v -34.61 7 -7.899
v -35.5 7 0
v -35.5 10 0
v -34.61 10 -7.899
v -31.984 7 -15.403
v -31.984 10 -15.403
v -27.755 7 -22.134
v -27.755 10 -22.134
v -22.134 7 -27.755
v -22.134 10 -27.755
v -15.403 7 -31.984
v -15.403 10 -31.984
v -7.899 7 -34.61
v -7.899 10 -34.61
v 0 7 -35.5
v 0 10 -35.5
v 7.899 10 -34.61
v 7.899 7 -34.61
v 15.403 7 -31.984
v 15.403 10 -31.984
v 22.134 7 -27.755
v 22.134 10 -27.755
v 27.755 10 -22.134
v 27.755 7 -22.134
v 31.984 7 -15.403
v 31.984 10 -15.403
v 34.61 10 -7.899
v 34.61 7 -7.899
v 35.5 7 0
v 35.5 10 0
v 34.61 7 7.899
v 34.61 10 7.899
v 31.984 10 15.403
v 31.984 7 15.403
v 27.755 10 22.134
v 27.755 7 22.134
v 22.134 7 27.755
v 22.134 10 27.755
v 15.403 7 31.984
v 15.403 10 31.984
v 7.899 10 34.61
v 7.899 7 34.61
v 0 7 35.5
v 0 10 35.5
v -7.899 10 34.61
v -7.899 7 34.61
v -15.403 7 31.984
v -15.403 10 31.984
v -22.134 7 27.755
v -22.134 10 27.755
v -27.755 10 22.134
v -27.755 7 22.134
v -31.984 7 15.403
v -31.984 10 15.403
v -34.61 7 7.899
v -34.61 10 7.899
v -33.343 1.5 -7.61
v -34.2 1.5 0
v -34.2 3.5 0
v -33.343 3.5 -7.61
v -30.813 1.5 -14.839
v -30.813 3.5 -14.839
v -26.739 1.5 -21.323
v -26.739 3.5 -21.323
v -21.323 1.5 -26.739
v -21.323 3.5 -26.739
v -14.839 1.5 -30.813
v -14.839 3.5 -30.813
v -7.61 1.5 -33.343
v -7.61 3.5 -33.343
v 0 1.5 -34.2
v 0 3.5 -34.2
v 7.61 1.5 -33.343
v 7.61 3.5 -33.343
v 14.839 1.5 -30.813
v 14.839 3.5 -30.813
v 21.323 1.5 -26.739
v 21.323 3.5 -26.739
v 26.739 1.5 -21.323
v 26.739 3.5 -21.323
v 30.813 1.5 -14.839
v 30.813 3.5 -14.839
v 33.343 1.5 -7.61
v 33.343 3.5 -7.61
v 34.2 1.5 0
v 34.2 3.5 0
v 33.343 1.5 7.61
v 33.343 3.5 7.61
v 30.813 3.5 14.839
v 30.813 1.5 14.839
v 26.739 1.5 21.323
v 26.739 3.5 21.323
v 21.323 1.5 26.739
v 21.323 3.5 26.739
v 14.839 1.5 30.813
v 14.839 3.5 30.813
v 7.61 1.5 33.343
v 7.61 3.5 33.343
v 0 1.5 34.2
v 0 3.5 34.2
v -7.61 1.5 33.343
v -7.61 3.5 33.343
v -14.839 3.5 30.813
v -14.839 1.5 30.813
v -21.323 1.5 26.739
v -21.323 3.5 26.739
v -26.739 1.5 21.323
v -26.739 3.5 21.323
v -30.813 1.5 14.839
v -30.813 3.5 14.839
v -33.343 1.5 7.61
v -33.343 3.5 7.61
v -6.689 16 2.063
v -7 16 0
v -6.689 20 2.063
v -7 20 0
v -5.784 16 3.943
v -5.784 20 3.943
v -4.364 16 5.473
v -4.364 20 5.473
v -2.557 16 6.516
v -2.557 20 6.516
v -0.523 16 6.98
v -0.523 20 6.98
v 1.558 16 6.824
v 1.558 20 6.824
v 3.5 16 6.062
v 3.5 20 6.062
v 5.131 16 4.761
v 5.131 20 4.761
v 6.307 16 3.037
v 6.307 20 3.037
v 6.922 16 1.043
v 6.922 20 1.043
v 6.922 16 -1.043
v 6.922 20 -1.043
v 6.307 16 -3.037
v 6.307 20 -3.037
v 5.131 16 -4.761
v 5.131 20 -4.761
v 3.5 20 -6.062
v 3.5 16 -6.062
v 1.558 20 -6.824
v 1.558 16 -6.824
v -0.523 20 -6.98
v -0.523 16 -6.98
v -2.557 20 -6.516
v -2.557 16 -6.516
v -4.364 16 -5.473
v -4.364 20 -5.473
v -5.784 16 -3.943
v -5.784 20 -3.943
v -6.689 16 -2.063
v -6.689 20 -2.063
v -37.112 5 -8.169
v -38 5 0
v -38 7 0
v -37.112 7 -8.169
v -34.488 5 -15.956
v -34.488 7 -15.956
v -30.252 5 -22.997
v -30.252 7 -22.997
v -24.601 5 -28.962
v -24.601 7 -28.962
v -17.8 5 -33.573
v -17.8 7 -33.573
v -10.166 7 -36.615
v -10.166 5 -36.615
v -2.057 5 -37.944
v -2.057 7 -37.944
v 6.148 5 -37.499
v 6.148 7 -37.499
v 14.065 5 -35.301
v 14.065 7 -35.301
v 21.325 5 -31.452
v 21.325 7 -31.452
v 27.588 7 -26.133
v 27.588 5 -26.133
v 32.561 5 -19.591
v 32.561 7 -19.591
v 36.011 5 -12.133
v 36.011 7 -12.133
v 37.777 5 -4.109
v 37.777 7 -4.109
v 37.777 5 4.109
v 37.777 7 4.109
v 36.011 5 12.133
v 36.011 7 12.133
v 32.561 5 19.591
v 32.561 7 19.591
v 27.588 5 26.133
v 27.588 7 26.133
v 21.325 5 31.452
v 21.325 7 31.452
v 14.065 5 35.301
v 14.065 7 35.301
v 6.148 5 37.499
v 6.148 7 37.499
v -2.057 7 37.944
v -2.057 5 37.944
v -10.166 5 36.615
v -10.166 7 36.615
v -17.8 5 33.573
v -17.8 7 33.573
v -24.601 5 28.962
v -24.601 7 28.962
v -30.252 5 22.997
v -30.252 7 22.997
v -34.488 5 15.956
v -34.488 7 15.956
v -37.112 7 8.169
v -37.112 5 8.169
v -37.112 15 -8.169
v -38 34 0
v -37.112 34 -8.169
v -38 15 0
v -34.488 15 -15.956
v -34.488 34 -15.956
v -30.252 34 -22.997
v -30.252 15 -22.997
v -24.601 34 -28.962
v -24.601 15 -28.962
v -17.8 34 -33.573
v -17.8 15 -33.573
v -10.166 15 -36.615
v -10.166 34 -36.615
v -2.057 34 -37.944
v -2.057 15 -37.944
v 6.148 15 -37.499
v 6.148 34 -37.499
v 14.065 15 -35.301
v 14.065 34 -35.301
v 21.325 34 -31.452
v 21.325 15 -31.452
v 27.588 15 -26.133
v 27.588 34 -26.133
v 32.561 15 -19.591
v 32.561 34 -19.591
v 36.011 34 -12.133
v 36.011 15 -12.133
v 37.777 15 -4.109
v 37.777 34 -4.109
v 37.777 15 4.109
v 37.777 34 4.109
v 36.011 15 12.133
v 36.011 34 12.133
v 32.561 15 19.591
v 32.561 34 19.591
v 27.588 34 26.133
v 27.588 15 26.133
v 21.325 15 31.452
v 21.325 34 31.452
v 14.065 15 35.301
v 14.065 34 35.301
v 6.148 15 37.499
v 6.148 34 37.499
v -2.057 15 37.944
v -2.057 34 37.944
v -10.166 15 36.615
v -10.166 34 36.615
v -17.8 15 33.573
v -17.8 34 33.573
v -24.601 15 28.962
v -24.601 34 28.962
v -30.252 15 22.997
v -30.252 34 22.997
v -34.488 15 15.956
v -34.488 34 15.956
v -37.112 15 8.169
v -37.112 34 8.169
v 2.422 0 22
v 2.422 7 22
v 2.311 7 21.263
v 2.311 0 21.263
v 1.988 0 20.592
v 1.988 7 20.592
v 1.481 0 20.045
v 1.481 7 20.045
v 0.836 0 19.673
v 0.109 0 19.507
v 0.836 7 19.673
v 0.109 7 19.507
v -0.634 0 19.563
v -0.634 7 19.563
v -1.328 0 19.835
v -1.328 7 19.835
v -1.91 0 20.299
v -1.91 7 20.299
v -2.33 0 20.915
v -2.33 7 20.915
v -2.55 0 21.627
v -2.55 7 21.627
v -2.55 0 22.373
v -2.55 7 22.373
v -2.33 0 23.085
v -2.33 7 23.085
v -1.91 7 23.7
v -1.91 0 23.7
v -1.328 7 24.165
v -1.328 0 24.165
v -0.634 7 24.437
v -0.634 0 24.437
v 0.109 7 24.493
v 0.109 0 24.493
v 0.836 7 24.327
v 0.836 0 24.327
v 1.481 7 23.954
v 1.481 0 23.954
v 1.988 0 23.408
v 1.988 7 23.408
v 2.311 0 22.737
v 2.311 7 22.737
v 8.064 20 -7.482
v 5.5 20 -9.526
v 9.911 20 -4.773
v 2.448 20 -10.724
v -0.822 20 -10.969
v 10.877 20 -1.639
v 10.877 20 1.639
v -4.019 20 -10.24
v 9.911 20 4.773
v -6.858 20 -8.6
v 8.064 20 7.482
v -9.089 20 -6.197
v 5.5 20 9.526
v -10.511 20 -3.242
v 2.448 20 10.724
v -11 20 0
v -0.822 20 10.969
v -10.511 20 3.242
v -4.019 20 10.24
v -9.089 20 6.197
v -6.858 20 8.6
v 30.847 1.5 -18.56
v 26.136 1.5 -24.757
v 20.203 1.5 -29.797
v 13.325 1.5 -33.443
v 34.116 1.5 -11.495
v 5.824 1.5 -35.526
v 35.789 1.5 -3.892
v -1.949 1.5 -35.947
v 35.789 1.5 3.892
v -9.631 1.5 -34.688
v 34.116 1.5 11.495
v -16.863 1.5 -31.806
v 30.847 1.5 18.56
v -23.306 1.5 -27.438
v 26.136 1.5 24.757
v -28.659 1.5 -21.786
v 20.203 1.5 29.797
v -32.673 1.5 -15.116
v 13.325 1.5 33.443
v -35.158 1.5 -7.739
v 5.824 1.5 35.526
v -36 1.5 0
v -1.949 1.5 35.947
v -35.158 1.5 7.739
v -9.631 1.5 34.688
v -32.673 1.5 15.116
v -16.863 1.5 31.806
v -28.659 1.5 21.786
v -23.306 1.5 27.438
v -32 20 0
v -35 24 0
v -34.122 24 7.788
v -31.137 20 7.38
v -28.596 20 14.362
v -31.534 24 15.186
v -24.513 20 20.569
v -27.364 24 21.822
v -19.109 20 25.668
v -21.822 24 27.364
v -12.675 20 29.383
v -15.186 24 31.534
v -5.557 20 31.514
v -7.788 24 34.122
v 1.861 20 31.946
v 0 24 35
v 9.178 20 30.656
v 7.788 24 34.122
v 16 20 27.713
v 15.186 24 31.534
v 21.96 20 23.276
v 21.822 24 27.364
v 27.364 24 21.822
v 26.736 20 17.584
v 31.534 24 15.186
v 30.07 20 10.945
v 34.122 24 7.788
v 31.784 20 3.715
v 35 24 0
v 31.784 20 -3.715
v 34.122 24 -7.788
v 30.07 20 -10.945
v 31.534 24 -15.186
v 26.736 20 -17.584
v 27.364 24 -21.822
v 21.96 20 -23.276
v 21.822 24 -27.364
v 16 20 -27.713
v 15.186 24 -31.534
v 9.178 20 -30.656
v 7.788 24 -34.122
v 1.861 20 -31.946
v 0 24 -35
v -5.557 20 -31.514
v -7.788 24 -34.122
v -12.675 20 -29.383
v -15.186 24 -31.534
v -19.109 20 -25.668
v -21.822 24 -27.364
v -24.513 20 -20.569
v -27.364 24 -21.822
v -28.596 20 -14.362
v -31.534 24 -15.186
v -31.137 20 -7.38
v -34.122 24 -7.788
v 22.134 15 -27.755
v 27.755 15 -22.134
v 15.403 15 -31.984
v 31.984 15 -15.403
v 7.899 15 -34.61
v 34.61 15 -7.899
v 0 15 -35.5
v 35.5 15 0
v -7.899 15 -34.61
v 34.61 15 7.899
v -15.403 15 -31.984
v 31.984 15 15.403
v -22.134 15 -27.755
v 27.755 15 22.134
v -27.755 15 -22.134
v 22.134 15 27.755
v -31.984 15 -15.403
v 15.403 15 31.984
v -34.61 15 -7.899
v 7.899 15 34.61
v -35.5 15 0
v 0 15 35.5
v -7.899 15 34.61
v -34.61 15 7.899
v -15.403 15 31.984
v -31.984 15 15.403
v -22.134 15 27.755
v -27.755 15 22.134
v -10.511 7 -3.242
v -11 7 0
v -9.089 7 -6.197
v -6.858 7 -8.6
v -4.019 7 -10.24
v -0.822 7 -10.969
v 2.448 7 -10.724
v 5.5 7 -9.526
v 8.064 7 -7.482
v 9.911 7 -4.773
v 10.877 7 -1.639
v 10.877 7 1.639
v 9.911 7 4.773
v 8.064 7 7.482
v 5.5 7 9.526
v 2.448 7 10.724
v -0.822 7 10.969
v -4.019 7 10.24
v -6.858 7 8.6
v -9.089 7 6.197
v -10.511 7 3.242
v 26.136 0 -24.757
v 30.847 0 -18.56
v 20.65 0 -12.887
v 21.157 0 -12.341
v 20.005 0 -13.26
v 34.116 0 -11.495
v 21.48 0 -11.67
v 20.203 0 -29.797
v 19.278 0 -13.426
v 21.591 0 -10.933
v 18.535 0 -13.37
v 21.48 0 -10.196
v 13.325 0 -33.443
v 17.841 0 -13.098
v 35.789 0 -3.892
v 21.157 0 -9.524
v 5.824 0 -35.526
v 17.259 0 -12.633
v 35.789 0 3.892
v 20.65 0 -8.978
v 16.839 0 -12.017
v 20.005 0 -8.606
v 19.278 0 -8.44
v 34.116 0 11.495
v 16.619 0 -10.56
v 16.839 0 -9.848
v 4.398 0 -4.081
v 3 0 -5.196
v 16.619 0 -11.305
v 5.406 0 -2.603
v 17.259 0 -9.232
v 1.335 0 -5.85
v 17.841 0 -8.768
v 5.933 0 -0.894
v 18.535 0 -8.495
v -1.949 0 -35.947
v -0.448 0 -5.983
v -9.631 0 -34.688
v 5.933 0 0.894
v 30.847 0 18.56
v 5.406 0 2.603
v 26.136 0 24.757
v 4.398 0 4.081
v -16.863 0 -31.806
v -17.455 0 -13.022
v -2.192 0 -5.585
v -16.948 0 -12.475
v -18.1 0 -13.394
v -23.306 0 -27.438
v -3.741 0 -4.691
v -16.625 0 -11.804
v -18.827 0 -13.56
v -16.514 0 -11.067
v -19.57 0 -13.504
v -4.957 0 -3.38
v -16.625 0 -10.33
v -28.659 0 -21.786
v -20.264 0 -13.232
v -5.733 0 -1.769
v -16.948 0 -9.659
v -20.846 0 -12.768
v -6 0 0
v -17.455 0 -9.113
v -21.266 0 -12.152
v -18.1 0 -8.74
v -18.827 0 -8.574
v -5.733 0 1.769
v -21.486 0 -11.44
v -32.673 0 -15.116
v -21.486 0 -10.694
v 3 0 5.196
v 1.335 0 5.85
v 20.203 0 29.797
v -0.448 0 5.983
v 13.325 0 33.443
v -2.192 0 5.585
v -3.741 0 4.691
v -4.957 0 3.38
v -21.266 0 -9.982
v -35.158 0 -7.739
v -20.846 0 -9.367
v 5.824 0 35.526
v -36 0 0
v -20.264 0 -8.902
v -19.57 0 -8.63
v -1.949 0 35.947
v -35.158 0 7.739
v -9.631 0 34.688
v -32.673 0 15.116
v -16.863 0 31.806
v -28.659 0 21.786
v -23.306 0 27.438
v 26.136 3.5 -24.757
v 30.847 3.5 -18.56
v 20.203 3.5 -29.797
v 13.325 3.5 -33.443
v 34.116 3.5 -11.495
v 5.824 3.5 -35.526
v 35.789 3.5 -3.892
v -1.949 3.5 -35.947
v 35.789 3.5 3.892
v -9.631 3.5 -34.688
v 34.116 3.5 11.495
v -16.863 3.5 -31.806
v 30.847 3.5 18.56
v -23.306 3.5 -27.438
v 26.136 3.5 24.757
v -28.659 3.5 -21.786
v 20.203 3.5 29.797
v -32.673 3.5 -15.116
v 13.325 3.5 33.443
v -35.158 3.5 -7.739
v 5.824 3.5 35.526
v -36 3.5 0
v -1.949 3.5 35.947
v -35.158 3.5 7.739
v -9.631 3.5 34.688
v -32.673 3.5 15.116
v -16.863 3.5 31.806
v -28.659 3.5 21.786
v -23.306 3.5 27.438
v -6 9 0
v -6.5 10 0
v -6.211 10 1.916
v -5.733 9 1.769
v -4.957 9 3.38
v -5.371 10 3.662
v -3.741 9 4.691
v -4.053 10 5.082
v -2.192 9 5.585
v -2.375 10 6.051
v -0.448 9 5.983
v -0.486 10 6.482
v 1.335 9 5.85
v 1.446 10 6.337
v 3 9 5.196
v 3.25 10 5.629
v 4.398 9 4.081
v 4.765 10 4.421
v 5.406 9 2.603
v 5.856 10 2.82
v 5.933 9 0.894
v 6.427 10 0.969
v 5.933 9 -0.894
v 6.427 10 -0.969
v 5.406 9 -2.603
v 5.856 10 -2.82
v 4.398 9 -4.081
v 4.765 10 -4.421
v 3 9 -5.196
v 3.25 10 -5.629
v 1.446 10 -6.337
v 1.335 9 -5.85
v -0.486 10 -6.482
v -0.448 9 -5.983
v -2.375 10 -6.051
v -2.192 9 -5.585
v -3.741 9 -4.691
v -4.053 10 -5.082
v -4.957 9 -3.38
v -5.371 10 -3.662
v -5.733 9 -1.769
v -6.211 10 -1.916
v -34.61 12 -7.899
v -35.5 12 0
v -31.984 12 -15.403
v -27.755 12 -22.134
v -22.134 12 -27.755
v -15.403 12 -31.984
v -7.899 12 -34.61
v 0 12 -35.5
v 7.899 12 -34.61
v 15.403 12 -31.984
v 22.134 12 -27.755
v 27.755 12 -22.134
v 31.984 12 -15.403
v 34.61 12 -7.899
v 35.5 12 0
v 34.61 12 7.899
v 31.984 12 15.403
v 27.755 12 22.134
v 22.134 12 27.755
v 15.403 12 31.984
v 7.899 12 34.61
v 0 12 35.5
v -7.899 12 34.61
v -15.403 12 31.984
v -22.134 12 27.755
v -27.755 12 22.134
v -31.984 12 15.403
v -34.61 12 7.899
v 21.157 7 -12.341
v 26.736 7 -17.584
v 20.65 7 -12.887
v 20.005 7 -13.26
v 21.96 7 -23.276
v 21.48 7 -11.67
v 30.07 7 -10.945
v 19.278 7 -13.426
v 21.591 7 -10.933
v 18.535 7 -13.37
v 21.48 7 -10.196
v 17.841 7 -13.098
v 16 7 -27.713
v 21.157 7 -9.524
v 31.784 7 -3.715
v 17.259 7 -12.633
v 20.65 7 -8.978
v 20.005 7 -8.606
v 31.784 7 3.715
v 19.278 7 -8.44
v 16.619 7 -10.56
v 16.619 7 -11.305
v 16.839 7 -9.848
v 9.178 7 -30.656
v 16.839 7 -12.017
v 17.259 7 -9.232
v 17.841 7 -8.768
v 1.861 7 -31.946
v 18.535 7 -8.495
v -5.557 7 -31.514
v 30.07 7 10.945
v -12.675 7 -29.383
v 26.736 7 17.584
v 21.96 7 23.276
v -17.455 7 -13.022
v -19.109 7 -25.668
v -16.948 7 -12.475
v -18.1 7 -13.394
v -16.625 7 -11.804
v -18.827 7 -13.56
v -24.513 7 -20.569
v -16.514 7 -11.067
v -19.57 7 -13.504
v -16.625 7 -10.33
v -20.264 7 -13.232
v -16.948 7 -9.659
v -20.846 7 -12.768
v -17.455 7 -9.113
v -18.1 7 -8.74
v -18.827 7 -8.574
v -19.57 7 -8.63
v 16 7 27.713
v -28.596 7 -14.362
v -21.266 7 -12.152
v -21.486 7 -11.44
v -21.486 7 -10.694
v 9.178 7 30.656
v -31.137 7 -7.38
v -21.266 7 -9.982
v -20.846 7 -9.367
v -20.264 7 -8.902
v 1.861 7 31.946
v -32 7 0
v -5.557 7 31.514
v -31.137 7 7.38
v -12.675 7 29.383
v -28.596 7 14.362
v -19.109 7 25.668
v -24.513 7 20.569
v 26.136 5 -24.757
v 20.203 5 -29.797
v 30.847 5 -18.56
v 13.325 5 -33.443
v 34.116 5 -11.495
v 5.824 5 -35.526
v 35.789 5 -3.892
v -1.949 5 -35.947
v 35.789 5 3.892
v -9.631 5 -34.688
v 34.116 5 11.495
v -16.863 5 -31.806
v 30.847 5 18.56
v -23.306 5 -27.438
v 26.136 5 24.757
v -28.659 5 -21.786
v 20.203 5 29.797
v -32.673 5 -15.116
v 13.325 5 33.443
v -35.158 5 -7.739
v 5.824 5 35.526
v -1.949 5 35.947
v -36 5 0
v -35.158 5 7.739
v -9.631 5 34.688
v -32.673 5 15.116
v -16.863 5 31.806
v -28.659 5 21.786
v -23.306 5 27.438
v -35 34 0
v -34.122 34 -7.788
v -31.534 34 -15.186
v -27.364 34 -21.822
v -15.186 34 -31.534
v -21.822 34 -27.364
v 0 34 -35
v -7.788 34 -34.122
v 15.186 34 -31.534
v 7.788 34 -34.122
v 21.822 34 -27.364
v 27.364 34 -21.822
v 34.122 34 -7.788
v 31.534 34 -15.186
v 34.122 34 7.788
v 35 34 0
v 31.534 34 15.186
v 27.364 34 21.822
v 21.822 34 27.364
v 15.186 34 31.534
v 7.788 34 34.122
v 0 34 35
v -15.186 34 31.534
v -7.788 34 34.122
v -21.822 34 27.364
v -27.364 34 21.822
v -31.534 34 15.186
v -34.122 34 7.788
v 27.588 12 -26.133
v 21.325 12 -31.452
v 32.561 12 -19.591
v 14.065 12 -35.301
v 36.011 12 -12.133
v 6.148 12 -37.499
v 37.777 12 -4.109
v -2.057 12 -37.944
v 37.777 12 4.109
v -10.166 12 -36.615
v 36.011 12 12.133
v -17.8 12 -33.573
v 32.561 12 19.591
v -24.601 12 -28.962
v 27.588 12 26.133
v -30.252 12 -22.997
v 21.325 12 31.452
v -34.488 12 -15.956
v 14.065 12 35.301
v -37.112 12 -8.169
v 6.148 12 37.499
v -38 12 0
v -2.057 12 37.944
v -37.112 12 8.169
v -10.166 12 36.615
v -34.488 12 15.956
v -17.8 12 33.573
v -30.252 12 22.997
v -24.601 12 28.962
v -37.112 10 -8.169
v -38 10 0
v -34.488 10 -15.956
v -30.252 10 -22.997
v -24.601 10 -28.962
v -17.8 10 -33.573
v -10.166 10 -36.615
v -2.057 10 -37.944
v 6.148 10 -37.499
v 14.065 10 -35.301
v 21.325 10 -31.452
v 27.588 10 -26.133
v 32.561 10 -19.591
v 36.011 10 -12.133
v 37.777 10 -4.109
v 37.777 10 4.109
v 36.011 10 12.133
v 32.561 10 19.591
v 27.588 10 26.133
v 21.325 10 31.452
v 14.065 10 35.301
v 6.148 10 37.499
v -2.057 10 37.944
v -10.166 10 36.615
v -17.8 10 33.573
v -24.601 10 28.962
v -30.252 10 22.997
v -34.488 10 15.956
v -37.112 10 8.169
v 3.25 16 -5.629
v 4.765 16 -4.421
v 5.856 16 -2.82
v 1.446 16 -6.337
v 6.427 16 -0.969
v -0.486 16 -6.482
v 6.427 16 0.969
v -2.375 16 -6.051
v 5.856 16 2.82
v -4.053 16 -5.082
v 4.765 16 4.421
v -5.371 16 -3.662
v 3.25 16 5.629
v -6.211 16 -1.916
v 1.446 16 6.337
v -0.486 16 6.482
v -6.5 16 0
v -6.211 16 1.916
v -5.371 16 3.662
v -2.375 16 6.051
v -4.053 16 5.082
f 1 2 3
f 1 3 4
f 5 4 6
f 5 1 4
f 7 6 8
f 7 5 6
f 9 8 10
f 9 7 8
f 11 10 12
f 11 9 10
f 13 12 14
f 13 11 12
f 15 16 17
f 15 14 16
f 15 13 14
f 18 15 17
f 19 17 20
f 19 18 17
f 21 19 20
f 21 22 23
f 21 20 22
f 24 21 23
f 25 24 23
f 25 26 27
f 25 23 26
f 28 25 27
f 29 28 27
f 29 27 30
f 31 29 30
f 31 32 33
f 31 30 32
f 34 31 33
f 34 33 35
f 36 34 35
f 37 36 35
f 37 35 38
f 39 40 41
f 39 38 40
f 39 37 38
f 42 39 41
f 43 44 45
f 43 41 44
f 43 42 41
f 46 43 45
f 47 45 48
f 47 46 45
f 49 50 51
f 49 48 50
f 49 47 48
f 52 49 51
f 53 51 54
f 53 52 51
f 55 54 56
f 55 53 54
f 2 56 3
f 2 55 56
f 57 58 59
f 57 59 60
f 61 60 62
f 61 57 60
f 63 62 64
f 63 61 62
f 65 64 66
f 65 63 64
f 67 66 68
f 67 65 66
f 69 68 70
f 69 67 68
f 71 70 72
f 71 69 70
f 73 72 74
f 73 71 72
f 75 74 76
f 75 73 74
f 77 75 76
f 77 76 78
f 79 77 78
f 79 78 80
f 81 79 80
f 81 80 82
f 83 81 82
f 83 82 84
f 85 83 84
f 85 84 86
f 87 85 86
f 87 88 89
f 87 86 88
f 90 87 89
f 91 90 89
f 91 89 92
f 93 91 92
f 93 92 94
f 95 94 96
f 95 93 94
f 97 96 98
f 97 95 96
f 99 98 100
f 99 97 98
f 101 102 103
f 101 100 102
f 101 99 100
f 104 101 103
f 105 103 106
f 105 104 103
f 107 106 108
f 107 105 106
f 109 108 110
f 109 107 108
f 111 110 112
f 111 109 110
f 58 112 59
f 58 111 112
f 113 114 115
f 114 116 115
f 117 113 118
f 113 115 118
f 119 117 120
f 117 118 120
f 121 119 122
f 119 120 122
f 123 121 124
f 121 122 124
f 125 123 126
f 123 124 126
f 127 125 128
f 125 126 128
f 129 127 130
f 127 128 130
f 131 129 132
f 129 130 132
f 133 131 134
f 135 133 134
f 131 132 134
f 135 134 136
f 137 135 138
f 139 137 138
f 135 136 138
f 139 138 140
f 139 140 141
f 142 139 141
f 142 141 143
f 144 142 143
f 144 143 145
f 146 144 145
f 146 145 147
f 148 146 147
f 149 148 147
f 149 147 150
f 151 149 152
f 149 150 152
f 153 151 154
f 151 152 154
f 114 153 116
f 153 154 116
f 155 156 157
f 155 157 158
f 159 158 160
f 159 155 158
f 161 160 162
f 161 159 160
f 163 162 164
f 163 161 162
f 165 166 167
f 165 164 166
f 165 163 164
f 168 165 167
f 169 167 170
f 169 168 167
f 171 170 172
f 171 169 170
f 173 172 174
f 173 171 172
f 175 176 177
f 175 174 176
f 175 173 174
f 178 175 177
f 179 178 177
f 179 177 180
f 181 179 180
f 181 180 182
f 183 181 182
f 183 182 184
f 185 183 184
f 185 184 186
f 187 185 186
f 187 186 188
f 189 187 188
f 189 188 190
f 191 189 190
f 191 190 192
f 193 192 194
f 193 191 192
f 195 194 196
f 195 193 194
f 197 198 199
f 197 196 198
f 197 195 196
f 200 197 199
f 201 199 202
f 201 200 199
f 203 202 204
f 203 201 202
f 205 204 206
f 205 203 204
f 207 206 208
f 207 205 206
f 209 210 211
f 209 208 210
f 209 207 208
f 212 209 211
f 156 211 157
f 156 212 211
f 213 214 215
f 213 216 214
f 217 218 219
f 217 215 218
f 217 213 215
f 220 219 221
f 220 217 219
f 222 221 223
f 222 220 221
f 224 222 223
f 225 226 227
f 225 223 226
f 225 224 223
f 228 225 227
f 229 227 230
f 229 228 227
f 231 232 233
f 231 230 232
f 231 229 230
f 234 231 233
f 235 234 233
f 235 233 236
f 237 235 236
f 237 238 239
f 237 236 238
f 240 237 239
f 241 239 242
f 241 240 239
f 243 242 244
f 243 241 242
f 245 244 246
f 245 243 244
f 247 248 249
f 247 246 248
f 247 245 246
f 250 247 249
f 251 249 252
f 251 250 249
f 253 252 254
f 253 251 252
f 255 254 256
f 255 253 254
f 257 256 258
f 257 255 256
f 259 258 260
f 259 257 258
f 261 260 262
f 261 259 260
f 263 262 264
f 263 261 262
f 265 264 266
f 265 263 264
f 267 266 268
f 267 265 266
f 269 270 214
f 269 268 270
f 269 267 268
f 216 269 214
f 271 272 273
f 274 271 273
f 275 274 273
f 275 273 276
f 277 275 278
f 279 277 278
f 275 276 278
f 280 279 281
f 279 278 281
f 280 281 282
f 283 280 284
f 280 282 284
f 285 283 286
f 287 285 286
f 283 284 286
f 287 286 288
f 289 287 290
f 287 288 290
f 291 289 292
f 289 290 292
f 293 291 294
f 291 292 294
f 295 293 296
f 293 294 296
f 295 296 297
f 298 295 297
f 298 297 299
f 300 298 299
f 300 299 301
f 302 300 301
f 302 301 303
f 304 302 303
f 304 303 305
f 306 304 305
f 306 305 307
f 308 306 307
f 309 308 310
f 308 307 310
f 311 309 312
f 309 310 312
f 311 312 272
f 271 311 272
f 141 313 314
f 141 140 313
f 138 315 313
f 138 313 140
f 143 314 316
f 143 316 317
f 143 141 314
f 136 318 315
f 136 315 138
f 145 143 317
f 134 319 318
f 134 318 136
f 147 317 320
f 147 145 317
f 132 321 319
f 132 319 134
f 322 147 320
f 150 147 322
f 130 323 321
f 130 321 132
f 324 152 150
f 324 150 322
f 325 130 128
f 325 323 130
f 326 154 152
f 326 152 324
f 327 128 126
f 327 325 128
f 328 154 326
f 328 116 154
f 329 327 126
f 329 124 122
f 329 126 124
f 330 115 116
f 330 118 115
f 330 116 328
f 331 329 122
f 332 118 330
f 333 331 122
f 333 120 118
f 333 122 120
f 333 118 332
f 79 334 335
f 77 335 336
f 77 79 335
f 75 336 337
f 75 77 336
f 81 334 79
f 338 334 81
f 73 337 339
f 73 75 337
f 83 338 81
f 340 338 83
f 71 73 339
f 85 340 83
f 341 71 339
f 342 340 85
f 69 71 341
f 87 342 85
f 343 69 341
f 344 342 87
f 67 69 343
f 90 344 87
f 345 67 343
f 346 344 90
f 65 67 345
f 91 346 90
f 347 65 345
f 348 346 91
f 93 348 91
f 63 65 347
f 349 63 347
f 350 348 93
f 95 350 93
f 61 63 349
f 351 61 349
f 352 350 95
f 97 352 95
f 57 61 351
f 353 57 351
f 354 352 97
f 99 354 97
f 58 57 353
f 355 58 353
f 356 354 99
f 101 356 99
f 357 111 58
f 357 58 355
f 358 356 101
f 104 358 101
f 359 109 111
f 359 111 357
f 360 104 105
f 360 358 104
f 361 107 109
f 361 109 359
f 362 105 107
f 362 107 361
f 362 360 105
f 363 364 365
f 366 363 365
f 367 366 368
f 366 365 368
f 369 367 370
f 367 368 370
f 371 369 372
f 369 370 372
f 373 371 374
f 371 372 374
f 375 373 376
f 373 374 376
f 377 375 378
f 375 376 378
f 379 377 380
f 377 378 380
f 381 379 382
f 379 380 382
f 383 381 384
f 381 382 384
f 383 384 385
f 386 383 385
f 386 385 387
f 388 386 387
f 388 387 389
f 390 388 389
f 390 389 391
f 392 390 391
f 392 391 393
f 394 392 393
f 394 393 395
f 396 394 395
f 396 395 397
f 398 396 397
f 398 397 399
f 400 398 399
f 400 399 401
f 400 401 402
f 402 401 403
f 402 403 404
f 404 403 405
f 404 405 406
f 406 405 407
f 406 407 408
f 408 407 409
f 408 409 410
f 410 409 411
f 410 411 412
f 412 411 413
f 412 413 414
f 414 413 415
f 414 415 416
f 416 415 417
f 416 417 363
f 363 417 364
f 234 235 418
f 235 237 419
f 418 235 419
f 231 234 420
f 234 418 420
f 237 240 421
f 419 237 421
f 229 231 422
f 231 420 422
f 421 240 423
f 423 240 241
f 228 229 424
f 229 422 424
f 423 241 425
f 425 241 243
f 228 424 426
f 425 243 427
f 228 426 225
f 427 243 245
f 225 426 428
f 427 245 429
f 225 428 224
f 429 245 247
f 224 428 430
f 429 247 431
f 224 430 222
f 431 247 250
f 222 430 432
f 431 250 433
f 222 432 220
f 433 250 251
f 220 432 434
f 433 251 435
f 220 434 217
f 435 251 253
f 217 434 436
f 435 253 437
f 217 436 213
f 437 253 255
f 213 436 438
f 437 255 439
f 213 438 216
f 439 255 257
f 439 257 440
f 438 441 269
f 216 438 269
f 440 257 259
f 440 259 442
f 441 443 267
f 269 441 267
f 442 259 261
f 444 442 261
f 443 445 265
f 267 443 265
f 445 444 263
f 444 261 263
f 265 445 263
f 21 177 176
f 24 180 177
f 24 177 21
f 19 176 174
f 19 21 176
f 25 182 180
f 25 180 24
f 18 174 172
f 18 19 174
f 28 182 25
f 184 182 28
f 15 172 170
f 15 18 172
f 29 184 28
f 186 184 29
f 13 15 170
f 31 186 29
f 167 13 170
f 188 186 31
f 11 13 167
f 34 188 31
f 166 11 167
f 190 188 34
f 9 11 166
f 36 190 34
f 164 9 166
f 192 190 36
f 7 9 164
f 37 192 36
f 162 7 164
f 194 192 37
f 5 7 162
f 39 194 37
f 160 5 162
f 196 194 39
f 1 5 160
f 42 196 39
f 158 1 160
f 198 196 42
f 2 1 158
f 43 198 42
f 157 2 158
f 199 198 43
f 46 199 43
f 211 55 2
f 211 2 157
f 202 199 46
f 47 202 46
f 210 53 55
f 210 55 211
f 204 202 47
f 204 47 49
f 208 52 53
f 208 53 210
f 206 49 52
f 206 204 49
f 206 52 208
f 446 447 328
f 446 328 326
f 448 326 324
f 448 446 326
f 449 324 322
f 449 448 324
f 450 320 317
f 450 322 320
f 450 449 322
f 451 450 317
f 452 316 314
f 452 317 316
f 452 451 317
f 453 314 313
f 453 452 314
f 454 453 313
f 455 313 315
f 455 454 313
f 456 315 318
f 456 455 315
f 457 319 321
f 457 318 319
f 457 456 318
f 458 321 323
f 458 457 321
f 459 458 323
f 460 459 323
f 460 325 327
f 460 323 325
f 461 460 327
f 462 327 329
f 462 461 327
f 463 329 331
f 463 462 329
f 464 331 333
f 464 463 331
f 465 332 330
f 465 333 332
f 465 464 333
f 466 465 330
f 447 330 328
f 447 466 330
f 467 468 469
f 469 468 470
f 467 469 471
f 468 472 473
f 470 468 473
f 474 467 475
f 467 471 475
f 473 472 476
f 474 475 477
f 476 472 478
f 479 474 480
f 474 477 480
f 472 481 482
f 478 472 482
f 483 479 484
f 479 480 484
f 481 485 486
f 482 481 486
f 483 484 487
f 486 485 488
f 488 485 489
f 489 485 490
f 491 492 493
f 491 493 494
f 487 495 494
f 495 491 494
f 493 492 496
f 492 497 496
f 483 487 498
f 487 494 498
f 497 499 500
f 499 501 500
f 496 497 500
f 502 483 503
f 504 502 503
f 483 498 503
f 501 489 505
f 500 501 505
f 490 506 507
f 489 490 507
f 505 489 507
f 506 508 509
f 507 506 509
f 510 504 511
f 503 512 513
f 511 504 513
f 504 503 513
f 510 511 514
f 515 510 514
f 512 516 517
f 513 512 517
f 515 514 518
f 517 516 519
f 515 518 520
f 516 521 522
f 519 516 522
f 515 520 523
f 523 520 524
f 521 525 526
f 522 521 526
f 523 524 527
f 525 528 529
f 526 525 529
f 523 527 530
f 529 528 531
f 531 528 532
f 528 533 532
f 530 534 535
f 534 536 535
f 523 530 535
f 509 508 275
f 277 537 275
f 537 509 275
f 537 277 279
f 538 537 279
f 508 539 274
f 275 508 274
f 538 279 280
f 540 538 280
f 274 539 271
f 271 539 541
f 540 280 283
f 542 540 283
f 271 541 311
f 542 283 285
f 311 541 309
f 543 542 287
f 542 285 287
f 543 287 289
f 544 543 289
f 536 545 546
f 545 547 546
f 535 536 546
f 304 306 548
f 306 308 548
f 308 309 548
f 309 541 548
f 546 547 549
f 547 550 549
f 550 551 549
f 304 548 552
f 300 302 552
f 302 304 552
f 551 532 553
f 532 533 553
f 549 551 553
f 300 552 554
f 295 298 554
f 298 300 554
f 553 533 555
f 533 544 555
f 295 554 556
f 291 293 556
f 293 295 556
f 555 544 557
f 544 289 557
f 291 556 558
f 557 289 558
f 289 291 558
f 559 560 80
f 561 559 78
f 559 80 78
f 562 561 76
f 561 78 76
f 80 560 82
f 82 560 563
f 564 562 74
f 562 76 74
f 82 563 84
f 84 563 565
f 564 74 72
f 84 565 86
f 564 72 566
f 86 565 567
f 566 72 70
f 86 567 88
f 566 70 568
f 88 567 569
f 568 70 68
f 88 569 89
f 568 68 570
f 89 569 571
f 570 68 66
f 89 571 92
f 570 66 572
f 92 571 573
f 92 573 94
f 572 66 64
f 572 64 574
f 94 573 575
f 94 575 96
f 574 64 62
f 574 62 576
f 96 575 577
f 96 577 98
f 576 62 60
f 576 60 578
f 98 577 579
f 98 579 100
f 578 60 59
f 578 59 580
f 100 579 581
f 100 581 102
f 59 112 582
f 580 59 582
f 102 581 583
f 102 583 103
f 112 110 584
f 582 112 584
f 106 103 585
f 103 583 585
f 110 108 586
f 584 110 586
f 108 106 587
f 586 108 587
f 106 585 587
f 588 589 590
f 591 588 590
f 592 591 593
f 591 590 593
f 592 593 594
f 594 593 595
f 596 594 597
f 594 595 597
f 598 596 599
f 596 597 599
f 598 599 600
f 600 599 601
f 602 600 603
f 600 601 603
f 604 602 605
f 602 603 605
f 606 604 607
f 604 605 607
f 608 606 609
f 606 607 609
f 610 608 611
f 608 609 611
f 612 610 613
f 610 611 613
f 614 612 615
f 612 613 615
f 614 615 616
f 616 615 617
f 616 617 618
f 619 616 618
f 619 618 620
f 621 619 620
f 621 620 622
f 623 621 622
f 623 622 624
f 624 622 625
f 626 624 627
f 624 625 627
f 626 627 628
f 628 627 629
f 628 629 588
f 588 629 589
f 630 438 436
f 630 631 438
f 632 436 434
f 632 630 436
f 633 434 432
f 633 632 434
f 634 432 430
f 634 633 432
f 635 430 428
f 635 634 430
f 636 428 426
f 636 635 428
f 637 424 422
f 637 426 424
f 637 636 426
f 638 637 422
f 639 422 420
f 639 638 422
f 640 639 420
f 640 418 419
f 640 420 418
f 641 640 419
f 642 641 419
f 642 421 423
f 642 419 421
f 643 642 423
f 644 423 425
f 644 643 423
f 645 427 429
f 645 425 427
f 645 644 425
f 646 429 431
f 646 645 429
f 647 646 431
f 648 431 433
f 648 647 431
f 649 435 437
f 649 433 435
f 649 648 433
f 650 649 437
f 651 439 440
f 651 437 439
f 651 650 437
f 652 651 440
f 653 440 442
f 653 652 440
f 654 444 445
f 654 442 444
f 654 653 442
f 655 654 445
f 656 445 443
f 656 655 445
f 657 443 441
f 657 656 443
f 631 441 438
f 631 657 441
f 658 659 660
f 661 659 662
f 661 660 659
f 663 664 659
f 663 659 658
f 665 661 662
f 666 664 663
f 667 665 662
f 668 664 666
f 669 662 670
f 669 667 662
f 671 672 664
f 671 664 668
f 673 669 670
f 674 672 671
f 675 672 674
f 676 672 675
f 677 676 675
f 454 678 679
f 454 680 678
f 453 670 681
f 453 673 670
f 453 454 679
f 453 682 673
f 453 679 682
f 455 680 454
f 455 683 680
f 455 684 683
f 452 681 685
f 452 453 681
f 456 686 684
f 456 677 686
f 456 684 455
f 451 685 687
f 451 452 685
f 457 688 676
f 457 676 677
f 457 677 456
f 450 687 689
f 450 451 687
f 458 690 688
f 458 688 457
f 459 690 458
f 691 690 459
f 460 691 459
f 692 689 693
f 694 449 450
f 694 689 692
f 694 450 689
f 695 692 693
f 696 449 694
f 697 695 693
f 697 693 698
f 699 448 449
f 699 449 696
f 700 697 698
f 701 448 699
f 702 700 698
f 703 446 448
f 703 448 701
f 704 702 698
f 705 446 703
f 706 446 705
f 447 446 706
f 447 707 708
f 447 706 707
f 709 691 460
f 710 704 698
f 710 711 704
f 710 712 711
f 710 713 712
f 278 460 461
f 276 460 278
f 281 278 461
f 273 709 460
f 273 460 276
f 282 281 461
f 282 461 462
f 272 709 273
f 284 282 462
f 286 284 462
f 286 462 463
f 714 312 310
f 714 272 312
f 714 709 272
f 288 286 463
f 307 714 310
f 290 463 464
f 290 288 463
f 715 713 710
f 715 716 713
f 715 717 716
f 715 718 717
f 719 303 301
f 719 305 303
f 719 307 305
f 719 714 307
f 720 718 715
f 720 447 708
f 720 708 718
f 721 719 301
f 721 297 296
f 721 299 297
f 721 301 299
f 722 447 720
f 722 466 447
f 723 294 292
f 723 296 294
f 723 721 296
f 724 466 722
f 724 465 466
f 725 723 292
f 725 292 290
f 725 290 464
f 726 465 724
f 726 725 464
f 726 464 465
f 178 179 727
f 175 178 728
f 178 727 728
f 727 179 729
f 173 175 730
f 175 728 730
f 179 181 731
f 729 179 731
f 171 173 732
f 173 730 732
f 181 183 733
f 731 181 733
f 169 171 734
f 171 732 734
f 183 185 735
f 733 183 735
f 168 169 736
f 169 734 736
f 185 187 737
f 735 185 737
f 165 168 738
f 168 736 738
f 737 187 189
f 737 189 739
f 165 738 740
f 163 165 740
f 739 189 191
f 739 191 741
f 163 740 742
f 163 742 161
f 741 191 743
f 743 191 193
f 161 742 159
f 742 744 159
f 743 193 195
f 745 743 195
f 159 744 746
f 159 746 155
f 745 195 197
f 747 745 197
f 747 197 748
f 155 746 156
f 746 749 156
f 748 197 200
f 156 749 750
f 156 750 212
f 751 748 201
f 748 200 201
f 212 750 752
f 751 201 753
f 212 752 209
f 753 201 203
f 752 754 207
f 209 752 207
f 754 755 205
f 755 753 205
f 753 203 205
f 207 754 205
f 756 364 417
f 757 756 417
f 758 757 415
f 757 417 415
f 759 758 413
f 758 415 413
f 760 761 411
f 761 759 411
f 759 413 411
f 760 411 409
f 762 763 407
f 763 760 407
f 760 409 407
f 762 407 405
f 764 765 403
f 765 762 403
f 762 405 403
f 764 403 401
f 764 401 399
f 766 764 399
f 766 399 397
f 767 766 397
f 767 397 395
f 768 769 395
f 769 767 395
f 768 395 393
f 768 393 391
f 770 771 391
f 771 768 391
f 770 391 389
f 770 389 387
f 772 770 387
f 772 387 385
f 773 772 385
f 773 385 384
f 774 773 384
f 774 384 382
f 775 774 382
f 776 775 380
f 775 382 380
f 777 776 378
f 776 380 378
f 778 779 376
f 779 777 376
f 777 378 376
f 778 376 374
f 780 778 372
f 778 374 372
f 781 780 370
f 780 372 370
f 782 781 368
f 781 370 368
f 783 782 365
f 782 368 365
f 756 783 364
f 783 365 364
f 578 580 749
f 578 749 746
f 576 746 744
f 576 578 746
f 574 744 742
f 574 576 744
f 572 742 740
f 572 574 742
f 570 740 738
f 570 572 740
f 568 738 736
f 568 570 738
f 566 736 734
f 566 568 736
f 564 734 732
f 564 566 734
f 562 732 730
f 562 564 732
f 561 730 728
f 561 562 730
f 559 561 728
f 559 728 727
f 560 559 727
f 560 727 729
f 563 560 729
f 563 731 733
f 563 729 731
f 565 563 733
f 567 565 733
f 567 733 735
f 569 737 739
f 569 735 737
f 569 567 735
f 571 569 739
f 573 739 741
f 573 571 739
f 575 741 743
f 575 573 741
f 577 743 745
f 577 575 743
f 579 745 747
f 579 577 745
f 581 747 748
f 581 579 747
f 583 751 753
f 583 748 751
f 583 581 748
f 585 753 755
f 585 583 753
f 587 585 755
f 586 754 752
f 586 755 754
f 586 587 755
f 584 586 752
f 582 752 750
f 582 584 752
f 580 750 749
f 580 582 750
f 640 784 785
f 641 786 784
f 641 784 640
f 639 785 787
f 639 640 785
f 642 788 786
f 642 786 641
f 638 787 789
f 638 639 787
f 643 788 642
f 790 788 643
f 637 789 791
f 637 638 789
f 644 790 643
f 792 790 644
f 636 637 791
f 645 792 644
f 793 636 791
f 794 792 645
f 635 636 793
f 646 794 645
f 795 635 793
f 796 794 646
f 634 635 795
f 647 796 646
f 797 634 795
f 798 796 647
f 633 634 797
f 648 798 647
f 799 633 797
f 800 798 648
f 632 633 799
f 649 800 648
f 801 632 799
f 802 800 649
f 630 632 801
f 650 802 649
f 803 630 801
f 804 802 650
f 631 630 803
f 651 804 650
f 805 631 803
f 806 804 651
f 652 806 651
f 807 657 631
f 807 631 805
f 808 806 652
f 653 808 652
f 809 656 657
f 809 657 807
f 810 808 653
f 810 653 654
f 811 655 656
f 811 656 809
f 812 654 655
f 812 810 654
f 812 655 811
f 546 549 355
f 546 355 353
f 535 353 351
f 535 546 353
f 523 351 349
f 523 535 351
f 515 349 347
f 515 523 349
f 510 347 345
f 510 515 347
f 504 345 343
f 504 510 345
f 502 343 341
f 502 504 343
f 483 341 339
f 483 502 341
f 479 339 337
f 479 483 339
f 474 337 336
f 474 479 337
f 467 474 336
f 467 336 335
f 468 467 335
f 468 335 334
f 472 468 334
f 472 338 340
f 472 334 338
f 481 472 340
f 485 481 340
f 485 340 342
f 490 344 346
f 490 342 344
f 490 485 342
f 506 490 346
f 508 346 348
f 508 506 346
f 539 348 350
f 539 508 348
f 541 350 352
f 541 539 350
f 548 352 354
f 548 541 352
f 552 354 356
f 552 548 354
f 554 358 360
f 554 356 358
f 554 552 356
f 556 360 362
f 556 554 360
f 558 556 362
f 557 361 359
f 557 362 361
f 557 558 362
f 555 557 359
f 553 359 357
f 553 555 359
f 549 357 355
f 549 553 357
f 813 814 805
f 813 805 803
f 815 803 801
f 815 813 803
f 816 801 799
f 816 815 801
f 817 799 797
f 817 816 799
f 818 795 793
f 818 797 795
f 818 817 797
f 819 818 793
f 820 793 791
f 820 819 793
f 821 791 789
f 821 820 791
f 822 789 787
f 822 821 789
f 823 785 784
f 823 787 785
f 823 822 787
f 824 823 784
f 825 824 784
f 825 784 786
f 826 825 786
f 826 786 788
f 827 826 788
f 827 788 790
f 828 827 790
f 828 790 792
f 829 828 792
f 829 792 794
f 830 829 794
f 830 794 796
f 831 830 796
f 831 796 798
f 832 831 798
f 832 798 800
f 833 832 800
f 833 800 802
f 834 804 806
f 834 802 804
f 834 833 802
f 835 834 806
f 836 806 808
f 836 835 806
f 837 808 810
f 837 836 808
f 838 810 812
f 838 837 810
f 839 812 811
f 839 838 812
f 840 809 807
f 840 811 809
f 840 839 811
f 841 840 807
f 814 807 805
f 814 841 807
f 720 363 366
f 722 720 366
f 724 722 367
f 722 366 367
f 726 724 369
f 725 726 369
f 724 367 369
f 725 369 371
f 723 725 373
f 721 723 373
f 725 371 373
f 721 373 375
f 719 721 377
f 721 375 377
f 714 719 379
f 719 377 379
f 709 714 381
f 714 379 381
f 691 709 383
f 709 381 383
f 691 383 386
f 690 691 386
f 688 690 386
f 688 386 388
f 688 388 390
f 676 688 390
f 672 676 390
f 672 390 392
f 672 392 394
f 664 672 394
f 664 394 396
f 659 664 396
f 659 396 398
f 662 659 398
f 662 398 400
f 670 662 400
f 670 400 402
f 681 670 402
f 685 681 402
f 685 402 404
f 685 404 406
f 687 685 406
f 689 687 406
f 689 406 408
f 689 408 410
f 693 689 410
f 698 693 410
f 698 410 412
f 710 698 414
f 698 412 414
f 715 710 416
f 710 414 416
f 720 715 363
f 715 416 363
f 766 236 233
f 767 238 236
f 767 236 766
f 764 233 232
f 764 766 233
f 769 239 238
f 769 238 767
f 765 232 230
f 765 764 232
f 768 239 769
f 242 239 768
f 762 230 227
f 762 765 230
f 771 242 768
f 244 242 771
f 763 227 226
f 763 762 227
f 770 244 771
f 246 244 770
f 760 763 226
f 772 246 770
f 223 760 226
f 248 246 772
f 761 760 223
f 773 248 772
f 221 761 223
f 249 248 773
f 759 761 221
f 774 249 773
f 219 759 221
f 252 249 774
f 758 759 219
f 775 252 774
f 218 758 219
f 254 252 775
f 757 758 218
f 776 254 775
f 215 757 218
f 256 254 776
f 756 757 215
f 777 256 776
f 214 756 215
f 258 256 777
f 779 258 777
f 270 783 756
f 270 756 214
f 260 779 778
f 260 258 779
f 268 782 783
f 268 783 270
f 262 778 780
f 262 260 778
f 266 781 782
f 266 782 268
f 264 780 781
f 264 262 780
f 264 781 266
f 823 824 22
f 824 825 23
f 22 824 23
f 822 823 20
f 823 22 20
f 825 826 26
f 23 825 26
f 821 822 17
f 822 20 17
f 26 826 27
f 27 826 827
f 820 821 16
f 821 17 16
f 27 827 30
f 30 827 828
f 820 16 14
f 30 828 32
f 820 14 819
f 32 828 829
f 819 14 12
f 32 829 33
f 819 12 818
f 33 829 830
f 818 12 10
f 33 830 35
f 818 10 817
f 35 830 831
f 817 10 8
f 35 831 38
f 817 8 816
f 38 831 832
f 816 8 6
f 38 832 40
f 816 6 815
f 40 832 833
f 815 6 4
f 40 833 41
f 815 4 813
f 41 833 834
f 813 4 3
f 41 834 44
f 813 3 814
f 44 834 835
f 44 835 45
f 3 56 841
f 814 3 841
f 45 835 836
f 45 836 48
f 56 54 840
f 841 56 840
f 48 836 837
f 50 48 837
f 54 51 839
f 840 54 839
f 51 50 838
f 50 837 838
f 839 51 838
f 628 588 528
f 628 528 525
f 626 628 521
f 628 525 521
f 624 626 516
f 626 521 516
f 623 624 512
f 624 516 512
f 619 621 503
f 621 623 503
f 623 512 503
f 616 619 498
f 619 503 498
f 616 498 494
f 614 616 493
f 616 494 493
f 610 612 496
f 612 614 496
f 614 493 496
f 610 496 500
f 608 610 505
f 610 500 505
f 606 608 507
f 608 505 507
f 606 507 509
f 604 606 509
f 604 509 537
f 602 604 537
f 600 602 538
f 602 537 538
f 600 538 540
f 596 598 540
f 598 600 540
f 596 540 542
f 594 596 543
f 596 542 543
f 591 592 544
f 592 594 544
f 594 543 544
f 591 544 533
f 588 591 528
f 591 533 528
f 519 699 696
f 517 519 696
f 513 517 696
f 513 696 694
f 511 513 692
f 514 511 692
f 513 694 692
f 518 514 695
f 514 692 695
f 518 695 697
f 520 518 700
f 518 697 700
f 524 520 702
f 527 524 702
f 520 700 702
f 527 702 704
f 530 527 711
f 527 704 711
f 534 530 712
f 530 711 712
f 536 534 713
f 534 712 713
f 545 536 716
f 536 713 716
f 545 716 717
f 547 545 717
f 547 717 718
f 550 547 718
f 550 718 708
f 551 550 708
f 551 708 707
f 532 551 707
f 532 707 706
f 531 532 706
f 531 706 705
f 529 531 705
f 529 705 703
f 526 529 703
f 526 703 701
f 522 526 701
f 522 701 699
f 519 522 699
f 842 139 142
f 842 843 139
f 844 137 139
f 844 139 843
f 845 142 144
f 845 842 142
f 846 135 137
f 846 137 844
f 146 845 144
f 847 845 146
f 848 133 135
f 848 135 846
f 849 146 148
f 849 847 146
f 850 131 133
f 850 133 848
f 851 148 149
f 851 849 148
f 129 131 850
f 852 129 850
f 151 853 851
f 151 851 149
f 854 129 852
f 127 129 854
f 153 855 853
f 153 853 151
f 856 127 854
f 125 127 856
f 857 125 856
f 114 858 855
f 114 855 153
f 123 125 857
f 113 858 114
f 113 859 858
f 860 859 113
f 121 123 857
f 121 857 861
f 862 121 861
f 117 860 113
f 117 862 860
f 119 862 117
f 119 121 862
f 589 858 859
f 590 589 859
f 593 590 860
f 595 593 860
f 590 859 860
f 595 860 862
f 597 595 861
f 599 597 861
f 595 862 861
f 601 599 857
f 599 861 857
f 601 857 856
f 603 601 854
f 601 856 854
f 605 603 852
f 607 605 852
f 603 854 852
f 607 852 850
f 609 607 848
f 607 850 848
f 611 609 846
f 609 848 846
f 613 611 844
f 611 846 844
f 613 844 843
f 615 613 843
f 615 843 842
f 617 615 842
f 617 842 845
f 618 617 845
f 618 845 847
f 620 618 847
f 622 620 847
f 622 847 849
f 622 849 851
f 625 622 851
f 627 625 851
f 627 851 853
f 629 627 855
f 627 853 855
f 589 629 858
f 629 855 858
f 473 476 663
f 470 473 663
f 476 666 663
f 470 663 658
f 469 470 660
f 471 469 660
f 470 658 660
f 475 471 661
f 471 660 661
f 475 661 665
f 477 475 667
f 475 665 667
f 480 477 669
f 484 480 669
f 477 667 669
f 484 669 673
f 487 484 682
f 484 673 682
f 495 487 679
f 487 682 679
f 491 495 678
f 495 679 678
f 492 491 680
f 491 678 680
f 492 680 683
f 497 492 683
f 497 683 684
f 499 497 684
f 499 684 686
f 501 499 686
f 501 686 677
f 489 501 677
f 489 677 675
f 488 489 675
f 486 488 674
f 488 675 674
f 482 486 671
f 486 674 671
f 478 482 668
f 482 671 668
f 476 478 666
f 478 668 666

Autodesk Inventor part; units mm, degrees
ref_plane "YZ Plane" through (0, 0, 0) normal (1, 0, 0) x (0, 1, 0)
ref_plane "XZ Plane" through (0, 0, 0) normal (0, 1, 0) x (-1, 0, 0)
ref_plane "XY Plane" through (0, 0, 0) normal (0, 0, 1) x (1, 0, 0)
sketch "Boceto2" plane through (0, 0, 0) normal (0, 0, 1) x (1, 0, 0)
  line L0 (-6, 9) -> (-6.5, 10)
  line L1 (-6.5, 10) -> (-6.5, 16)
  line L2 (-6.5, 16) -> (-7, 16)
  line L3 (-7, 16) -> (-7, 20)
  line L4 (-7, 20) -> (-11, 20)
  line L5 (-11, 20) -> (-11, 7)
  line L6 (-11, 7) -> (-32, 7)
  line L7 (-32, 7) -> (-32, 20)
  line L8 (-32, 20) -> (-35, 24)
  line L9 (-35, 34) -> (-38, 34)
  line L10 (-38, 34) -> (-38, 15)
  line L11 (-38, 15) -> (-35.5, 15)
  line L12 (-35.5, 12) -> (-38, 12)
  line L13 (-38, 10) -> (-35.5, 10)
  line L14 (-35.5, 7) -> (-38, 7)
  line L15 (-38, 5) -> (-36, 5)
  line L16 (-36, 5) -> (-36, 3.5)
  line L17 (-36, 3.5) -> (-34.2, 3.5)
  line L18 (-34.2, 3.5) -> (-34.2, 1.5)
  line L19 (-34.2, 1.5) -> (-36, 1.5)
  line L20 (-36, 1.5) -> (-36, 0)
  line L21 (-6, 9) -> (-6, 0)
  line L22 (-36, 0) -> (-6, 0)
  line L23 (-35.5, 10) -> (-35.5, 7)
  line L24 (-38, 12) -> (-38, 10)
  line L25 (-35, 34) -> (-35, 24)
  line L26 (-35.5, 15) -> (-35.5, 12)
  line L27 (0, -6.8) -> (0, 40.8) projected
  line L28 (-38, 7) -> (-38, 5)
  point P0 (0, 0)
  dimension "d2" = 9
  dimension "d3" = 1
  dimension "d4" = 0.5
  dimension "d5" = 0.5
  dimension "d6" = 6
  dimension "d7" = 4
  dimension "d8" = 4
  dimension "d9" = 7
  dimension "d16" = 1.5
  dimension "d17" = 1.8
  dimension "d19" = 2
  dimension "d20" = 1.5
  dimension "d21" = 2
  dimension "d23" = 3
  dimension "d24" = 2
  dimension "d25" = 3
  dimension "d33" = 38
  dimension "d35" = 6
  dimension "d38" = 4
  dimension "d39" = 21
  dimension "d40" = 13
  dimension "d42" = 2.5
  dimension "d43" = 3
  dimension "d44" = 2.5
  dimension "d49" = 2
  dimension "d51" = 10
revolve "Revolución1" add sketch "Boceto2" angle 360 about axis through (0, -10, 0) along (0, 1, 0)
sketch "Boceto3" plane through (0, 7, 0) normal (0, 1, 0) x (1, 0, 0)
  line L0 (-0.0776, -21.9999) -> (-19.0136, 11.0671) construction
  line L1 (-19.0136, 11.0671) -> (19.0912, 10.9327) construction
  line L2 (19.0912, 10.9327) -> (-0.0776, -21.9999) construction
  circle A0 centre (0, 0) radius 11 construction
  circle A1 centre (0, 0) radius 11 projected
  circle A2 centre (-0.0776, -21.9999) radius 2.5
  circle A3 centre (19.0912, 10.9327) radius 2.5
  circle A4 centre (-19.0136, 11.0671) radius 2.5
  dimension "d56" = 5
extrude "Extrusión1" cut sketch "Boceto3" against normal up to surface (7 mm away) contours A2 | A3 | A4
properties part number "PARTE_SUPERIOR_IGNICION"
